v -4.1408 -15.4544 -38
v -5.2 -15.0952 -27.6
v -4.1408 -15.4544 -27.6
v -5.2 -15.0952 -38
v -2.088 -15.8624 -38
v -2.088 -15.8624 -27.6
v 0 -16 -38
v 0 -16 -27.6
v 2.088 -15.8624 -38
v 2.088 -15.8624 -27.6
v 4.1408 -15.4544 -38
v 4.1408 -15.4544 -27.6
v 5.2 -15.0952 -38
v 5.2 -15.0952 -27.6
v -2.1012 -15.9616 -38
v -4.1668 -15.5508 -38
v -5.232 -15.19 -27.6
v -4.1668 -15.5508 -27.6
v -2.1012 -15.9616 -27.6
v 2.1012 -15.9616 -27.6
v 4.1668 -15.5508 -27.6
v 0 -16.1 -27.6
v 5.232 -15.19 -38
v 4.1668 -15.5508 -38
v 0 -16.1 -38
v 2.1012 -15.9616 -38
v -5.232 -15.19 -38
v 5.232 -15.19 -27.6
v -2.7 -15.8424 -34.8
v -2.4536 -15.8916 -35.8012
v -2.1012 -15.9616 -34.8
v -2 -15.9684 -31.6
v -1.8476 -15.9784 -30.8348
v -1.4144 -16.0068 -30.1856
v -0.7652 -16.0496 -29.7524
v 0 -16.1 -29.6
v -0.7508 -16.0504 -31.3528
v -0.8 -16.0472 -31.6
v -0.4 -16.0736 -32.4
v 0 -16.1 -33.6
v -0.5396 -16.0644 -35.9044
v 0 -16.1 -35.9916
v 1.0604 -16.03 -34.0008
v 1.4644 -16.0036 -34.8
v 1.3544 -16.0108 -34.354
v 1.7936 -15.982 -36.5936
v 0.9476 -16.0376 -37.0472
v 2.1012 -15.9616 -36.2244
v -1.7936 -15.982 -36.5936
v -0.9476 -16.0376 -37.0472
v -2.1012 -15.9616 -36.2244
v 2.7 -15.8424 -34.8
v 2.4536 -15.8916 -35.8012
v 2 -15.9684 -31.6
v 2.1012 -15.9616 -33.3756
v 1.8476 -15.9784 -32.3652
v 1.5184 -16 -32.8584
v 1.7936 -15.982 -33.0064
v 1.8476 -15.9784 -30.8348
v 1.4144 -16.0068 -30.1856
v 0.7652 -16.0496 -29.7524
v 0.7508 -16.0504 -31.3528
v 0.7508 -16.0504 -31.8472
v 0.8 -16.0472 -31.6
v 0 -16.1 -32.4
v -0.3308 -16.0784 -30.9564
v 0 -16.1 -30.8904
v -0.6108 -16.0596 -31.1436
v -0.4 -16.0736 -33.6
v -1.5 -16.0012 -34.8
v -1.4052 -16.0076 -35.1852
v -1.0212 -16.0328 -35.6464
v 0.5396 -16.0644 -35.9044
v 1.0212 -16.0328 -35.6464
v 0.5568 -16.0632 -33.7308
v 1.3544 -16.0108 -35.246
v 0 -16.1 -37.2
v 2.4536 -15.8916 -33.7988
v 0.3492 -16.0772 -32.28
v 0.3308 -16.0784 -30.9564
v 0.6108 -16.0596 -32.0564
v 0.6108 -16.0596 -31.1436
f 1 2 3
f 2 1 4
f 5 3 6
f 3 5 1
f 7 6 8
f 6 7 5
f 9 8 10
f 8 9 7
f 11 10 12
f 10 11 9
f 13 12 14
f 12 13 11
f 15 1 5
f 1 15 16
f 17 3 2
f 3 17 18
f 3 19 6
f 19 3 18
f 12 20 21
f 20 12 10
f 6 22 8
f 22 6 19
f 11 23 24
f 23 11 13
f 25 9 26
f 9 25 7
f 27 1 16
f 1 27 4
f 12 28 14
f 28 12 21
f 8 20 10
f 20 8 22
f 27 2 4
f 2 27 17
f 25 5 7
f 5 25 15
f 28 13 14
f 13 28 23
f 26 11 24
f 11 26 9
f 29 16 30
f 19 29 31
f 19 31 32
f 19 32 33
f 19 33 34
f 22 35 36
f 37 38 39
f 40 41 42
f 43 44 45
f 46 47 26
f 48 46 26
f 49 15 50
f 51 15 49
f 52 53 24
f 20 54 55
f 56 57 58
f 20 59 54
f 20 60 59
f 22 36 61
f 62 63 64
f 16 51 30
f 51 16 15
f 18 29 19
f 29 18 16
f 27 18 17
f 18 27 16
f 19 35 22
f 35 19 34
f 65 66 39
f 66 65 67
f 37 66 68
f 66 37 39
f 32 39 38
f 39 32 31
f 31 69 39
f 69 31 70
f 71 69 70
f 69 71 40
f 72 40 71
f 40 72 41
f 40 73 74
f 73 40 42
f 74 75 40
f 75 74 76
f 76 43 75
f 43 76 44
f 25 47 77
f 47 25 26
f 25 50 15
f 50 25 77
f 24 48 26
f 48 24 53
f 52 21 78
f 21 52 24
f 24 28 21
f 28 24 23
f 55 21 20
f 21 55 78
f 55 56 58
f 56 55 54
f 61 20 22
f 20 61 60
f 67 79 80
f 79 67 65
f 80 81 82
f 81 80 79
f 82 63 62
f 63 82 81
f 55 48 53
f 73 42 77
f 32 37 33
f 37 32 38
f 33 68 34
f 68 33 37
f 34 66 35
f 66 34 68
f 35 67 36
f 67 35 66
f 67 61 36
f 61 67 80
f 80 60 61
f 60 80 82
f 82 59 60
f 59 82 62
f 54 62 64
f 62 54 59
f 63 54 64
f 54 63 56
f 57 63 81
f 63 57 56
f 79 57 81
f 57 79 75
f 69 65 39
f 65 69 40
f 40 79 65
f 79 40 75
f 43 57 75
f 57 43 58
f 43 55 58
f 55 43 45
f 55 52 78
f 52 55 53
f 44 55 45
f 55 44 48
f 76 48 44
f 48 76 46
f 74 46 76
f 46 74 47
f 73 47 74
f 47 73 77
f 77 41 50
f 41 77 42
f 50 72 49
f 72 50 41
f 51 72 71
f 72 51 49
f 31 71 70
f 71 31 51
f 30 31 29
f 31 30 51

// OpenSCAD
// file: s/6259b01.scad
use <../../lib.scad>
function ldraw_lib__s__6259b01() = [
// 0 ~Sticker Back  1.3 x  1.3 (Formed)
// 0 Name: s\6259b01.dat
// 0 Author: Chris Böhnke [KnightOfTarenta]
// 0 !LDRAW_ORG Subpart UPDATE 2026-06
// 0 !LICENSE Licensed under CC BY 4.0 : see CAreadme.txt
// 
// 0 BFC CERTIFY CCW
  [0,"BFC","CERTIFY"],
  [0,"BFC","CCW"],
// 
// 0 !HISTORY 2026-06-28 [OrionP] Official Update 2026-06
// 
// 0 // Sticker Backside
// 4 16 -13 69 -37.738 -10.352 69 -38.636 -10.352 95 -38.636 -13 95 -37.738
  [4,16,-13,69,-37.738,-10.352,69,-38.636,-10.352,95,-38.636,-13,95,-37.738],
// 4 16 -10.352 69 -38.636 -5.22 69 -39.656 -5.22 95 -39.656 -10.352 95 -38.636
  [4,16,-10.352,69,-38.636,-5.22,69,-39.656,-5.22,95,-39.656,-10.352,95,-38.636],
// 4 16 -5.22 95 -39.656 -5.22 69 -39.656 0 69 -40 0 95 -40
  [4,16,-5.22,95,-39.656,-5.22,69,-39.656,0,69,-40,0,95,-40],
// 4 16 0 69 -40 5.22 69 -39.656 5.22 95 -39.656 0 95 -40
  [4,16,0,69,-40,5.22,69,-39.656,5.22,95,-39.656,0,95,-40],
// 4 16 5.22 69 -39.656 10.352 69 -38.636 10.352 95 -38.636 5.22 95 -39.656
  [4,16,5.22,69,-39.656,10.352,69,-38.636,10.352,95,-38.636,5.22,95,-39.656],
// 4 16 10.352 69 -38.636 13 69 -37.738 13 95 -37.738 10.352 95 -38.636
  [4,16,10.352,69,-38.636,13,69,-37.738,13,95,-37.738,10.352,95,-38.636],
// 
// 0 // Conditional Lines Back
// 5 24 -10.352 69 -38.636 -10.352 95 -38.636 -5.22 69 -39.656 -13 95 -37.738
  [5,24,-10.352,69,-38.636,-10.352,95,-38.636,-5.22,69,-39.656,-13,95,-37.738],
// 5 24 -5.22 69 -39.656 -5.22 95 -39.656 0 69 -40 -10.352 95 -38.636
  [5,24,-5.22,69,-39.656,-5.22,95,-39.656,0,69,-40,-10.352,95,-38.636],
// 5 24 10.352 69 -38.636 10.352 95 -38.636 5.22 95 -39.656 13 69 -37.738
  [5,24,10.352,69,-38.636,10.352,95,-38.636,5.22,95,-39.656,13,69,-37.738],
// 5 24 0 69 -40 0 95 -40 5.22 69 -39.656 -5.22 95 -39.656
  [5,24,0,69,-40,0,95,-40,5.22,69,-39.656,-5.22,95,-39.656],
// 5 24 5.22 69 -39.656 5.22 95 -39.656 10.352 69 -38.636 0 95 -40
  [5,24,5.22,69,-39.656,5.22,95,-39.656,10.352,69,-38.636,0,95,-40],
// 
// 0 // Sticker Sides
// 4 16 -10.417 95 -38.877 -10.352 95 -38.636 -5.22 95 -39.656 -5.253 95 -39.904
  [4,16,-10.417,95,-38.877,-10.352,95,-38.636,-5.22,95,-39.656,-5.253,95,-39.904],
// 4 16 -10.417 69 -38.877 -10.352 69 -38.636 -13 69 -37.738 -13.08 69 -37.975
  [4,16,-10.417,69,-38.877,-10.352,69,-38.636,-13,69,-37.738,-13.08,69,-37.975],
// 4 16 -5.253 69 -39.904 -5.22 69 -39.656 -10.352 69 -38.636 -10.417 69 -38.877
  [4,16,-5.253,69,-39.904,-5.22,69,-39.656,-10.352,69,-38.636,-10.417,69,-38.877],
// 4 16 5.22 69 -39.656 5.253 69 -39.904 10.417 69 -38.877 10.352 69 -38.636
  [4,16,5.22,69,-39.656,5.253,69,-39.904,10.417,69,-38.877,10.352,69,-38.636],
// 4 16 0 69 -40.25 0 69 -40 -5.22 69 -39.656 -5.253 69 -39.904
  [4,16,0,69,-40.25,0,69,-40,-5.22,69,-39.656,-5.253,69,-39.904],
// 4 16 13 95 -37.738 13.08 95 -37.975 10.417 95 -38.877 10.352 95 -38.636
  [4,16,13,95,-37.738,13.08,95,-37.975,10.417,95,-38.877,10.352,95,-38.636],
// 4 16 0 95 -40.25 0 95 -40 5.22 95 -39.656 5.253 95 -39.904
  [4,16,0,95,-40.25,0,95,-40,5.22,95,-39.656,5.253,95,-39.904],
// 4 16 -10.352 95 -38.636 -10.417 95 -38.877 -13.08 95 -37.975 -13 95 -37.738
  [4,16,-10.352,95,-38.636,-10.417,95,-38.877,-13.08,95,-37.975,-13,95,-37.738],
// 4 16 13.08 69 -37.975 13 69 -37.738 10.352 69 -38.636 10.417 69 -38.877
  [4,16,13.08,69,-37.975,13,69,-37.738,10.352,69,-38.636,10.417,69,-38.877],
// 4 16 5.253 69 -39.904 5.22 69 -39.656 0 69 -40 0 69 -40.25
  [4,16,5.253,69,-39.904,5.22,69,-39.656,0,69,-40,0,69,-40.25],
// 4 16 -13.08 69 -37.975 -13 69 -37.738 -13 95 -37.738 -13.08 95 -37.975
  [4,16,-13.08,69,-37.975,-13,69,-37.738,-13,95,-37.738,-13.08,95,-37.975],
// 4 16 0 95 -40 0 95 -40.25 -5.253 95 -39.904 -5.22 95 -39.656
  [4,16,0,95,-40,0,95,-40.25,-5.253,95,-39.904,-5.22,95,-39.656],
// 4 16 13.08 95 -37.975 13 95 -37.738 13 69 -37.738 13.08 69 -37.975
  [4,16,13.08,95,-37.975,13,95,-37.738,13,69,-37.738,13.08,69,-37.975],
// 4 16 10.352 95 -38.636 10.417 95 -38.877 5.253 95 -39.904 5.22 95 -39.656
  [4,16,10.352,95,-38.636,10.417,95,-38.877,5.253,95,-39.904,5.22,95,-39.656],
// 
// 0 // Conditional Lines Front
// 5 24 0 95 -40.25 0 69 -40.25 5.253 95 -39.904 -5.253 69 -39.904
  [5,24,0,95,-40.25,0,69,-40.25,5.253,95,-39.904,-5.253,69,-39.904],
// 5 24 -5.253 95 -39.904 -5.253 69 -39.904 -10.417 69 -38.877 0 95 -40.25
  [5,24,-5.253,95,-39.904,-5.253,69,-39.904,-10.417,69,-38.877,0,95,-40.25],
// 5 24 5.253 95 -39.904 5.253 69 -39.904 0 69 -40.25 10.417 95 -38.877
  [5,24,5.253,95,-39.904,5.253,69,-39.904,0,69,-40.25,10.417,95,-38.877],
// 5 24 10.417 95 -38.877 10.417 69 -38.877 5.253 69 -39.904 13.08 95 -37.975
  [5,24,10.417,95,-38.877,10.417,69,-38.877,5.253,69,-39.904,13.08,95,-37.975],
// 5 24 -10.417 95 -38.877 -10.417 69 -38.877 -13.08 69 -37.975 -5.253 95 -39.904
  [5,24,-10.417,95,-38.877,-10.417,69,-38.877,-13.08,69,-37.975,-5.253,95,-39.904],
];
module ldraw_lib__s__6259b01(step=0, col=false, unit=2/5, alt=false, line=0.2, solid=!$preview)
    makepoly(ldraw_lib__s__6259b01(), step=step, col=col, unit=unit, alt=alt, line=line, solid=solid);
ldraw_lib__s__6259b01(line=0.2);
// main file
use <../lib.scad>
use <s/6259b01.scad>
function ldraw_lib__169665gc01() = [
// 0 Sticker  1.3 x  1.3 with Black Number "3" (Formed)
// 0 Name: 169665gc01.dat
// 0 Author: Chris Böhnke [KnightOfTarenta]
// 0 !LDRAW_ORG Part UPDATE 2026-06
// 0 !LICENSE Licensed under CC BY 4.0 : see CAreadme.txt
// 
// 0 BFC CERTIFY CCW
  [0,"BFC","CERTIFY"],
  [0,"BFC","CCW"],
// 
// 0 !KEYWORDS Booster Rocket, Bricklink 6339stk01, Brickowl 588738, Launch Command
// 0 !KEYWORDS Rebrickable 169665, set 6339, Shuttle Launch Pad, space port, town
// 
// 0 !HISTORY 2026-06-28 [OrionP] Official Update 2026-06
// 
// 1 16 0 0 0 1 0 0 0 1 0 0 0 1 s\6259b01.dat
  [1,16,0,0,0,1,0,0,0,1,0,0,0,1, ldraw_lib__s__6259b01()],
// 
// 0 // Colour 16 Main Colour
// 3 16 -6.75 87 -39.606 -10.417 95 -38.877 -6.134 89.503 -39.729
  [3,16,-6.75,87,-39.606,-10.417,95,-38.877,-6.134,89.503,-39.729],
// 3 16 -5.253 69 -39.904 -6.75 87 -39.606 -5.253 87 -39.904
  [3,16,-5.253,69,-39.904,-6.75,87,-39.606,-5.253,87,-39.904],
// 3 16 -5.253 69 -39.904 -5.253 87 -39.904 -5 79 -39.921
  [3,16,-5.253,69,-39.904,-5.253,87,-39.904,-5,79,-39.921],
// 3 16 -5.253 69 -39.904 -5 79 -39.921 -4.619 77.087 -39.946
  [3,16,-5.253,69,-39.904,-5,79,-39.921,-4.619,77.087,-39.946],
// 3 16 -5.253 69 -39.904 -4.619 77.087 -39.946 -3.536 75.464 -40.017
  [3,16,-5.253,69,-39.904,-4.619,77.087,-39.946,-3.536,75.464,-40.017],
// 3 16 0 69 -40.25 -1.913 74.381 -40.124 0 74 -40.25
  [3,16,0,69,-40.25,-1.913,74.381,-40.124,0,74,-40.25],
// 3 16 -1.877 78.382 -40.126 -2 79 -40.118 -1 81 -40.184
  [3,16,-1.877,78.382,-40.126,-2,79,-40.118,-1,81,-40.184],
// 3 16 0 84 -40.25 -1.349 89.761 -40.161 0 89.979 -40.25
  [3,16,0,84,-40.25,-1.349,89.761,-40.161,0,89.979,-40.25],
// 3 16 2.651 85.002 -40.075 3.661 87 -40.009 3.386 85.885 -40.027
  [3,16,2.651,85.002,-40.075,3.661,87,-40.009,3.386,85.885,-40.027],
// 3 16 4.484 91.484 -39.955 2.369 92.618 -40.094 5.253 95 -39.904
  [3,16,4.484,91.484,-39.955,2.369,92.618,-40.094,5.253,95,-39.904],
// 3 16 5.253 90.561 -39.904 4.484 91.484 -39.955 5.253 95 -39.904
  [3,16,5.253,90.561,-39.904,4.484,91.484,-39.955,5.253,95,-39.904],
// 3 16 -4.484 91.484 -39.955 -5.253 95 -39.904 -2.369 92.618 -40.094
  [3,16,-4.484,91.484,-39.955,-5.253,95,-39.904,-2.369,92.618,-40.094],
// 3 16 -5.253 90.561 -39.904 -5.253 95 -39.904 -4.484 91.484 -39.955
  [3,16,-5.253,90.561,-39.904,-5.253,95,-39.904,-4.484,91.484,-39.955],
// 3 16 6.75 87 -39.606 6.134 89.503 -39.729 10.417 95 -38.877
  [3,16,6.75,87,-39.606,6.134,89.503,-39.729,10.417,95,-38.877],
// 3 16 5.253 69 -39.904 5 79 -39.921 5.253 83.439 -39.904
  [3,16,5.253,69,-39.904,5,79,-39.921,5.253,83.439,-39.904],
// 3 16 4.619 80.913 -39.946 3.796 82.146 -40 4.484 82.516 -39.955
  [3,16,4.619,80.913,-39.946,3.796,82.146,-40,4.484,82.516,-39.955],
// 3 16 5.253 69 -39.904 4.619 77.087 -39.946 5 79 -39.921
  [3,16,5.253,69,-39.904,4.619,77.087,-39.946,5,79,-39.921],
// 3 16 5.253 69 -39.904 3.536 75.464 -40.017 4.619 77.087 -39.946
  [3,16,5.253,69,-39.904,3.536,75.464,-40.017,4.619,77.087,-39.946],
// 3 16 0 69 -40.25 0 74 -40.25 1.913 74.381 -40.124
  [3,16,0,69,-40.25,0,74,-40.25,1.913,74.381,-40.124],
// 3 16 1.877 78.382 -40.126 1.877 79.618 -40.126 2 79 -40.118
  [3,16,1.877,78.382,-40.126,1.877,79.618,-40.126,2,79,-40.118],
// 4 16 -5.253 95 -39.904 -5.253 90.561 -39.904 -6.134 89.503 -39.729 -10.417 95 -38.877
  [4,16,-5.253,95,-39.904,-5.253,90.561,-39.904,-6.134,89.503,-39.729,-10.417,95,-38.877],
// 4 16 -10.417 69 -38.877 -10.417 95 -38.877 -6.75 87 -39.606 -5.253 69 -39.904
  [4,16,-10.417,69,-38.877,-10.417,95,-38.877,-6.75,87,-39.606,-5.253,69,-39.904],
// 4 16 -10.417 69 -38.877 -13.08 69 -37.975 -13.08 95 -37.975 -10.417 95 -38.877
  [4,16,-10.417,69,-38.877,-13.08,69,-37.975,-13.08,95,-37.975,-10.417,95,-38.877],
// 4 16 -5.253 69 -39.904 -3.536 75.464 -40.017 -1.913 74.381 -40.124 0 69 -40.25
  [4,16,-5.253,69,-39.904,-3.536,75.464,-40.017,-1.913,74.381,-40.124,0,69,-40.25],
// 4 16 0 81 -40.25 0 77.226 -40.25 -.827 77.391 -40.196 -1 81 -40.184
  [4,16,0,81,-40.25,0,77.226,-40.25,-.827,77.391,-40.196,-1,81,-40.184],
// 4 16 -1 81 -40.184 -.827 77.391 -40.196 -1.527 77.859 -40.149 -1.877 78.382 -40.126
  [4,16,-1,81,-40.184,-.827,77.391,-40.196,-1.527,77.859,-40.149,-1.877,78.382,-40.126],
// 4 16 -5.253 87 -39.904 -1 81 -40.184 -2 79 -40.118 -5 79 -39.921
  [4,16,-5.253,87,-39.904,-1,81,-40.184,-2,79,-40.118,-5,79,-39.921],
// 4 16 -1 84 -40.184 -1 81 -40.184 -5.253 87 -39.904 -3.75 87 -40.003
  [4,16,-1,84,-40.184,-1,81,-40.184,-5.253,87,-39.904,-3.75,87,-40.003],
// 4 16 0 84 -40.25 -1 84 -40.184 -3.75 87 -40.003 -3.513 87.963 -40.019
  [4,16,0,84,-40.25,-1,84,-40.184,-3.75,87,-40.003,-3.513,87.963,-40.019],
// 4 16 0 84 -40.25 -3.513 87.963 -40.019 -2.553 89.116 -40.082 -1.349 89.761 -40.161
  [4,16,0,84,-40.25,-3.513,87.963,-40.019,-2.553,89.116,-40.082,-1.349,89.761,-40.161],
// 4 16 0 84 -40.25 0 89.979 -40.25 1.349 89.761 -40.161 2.553 89.116 -40.082
  [4,16,0,84,-40.25,0,89.979,-40.25,1.349,89.761,-40.161,2.553,89.116,-40.082],
// 4 16 0 84 -40.25 2.553 89.116 -40.082 3.386 88.115 -40.027 1.392 84.327 -40.158
  [4,16,0,84,-40.25,2.553,89.116,-40.082,3.386,88.115,-40.027,1.392,84.327,-40.158],
// 4 16 2.651 85.002 -40.075 1.392 84.327 -40.158 3.386 88.115 -40.027 3.661 87 -40.009
  [4,16,2.651,85.002,-40.075,1.392,84.327,-40.158,3.386,88.115,-40.027,3.661,87,-40.009],
// 4 16 2.369 92.618 -40.094 0 93 -40.25 0 95 -40.25 5.253 95 -39.904
  [4,16,2.369,92.618,-40.094,0,93,-40.25,0,95,-40.25,5.253,95,-39.904],
// 4 16 0 95 -40.25 0 93 -40.25 -2.369 92.618 -40.094 -5.253 95 -39.904
  [4,16,0,95,-40.25,0,93,-40.25,-2.369,92.618,-40.094,-5.253,95,-39.904],
// 4 16 10.417 95 -38.877 6.134 89.503 -39.729 5.253 90.561 -39.904 5.253 95 -39.904
  [4,16,10.417,95,-38.877,6.134,89.503,-39.729,5.253,90.561,-39.904,5.253,95,-39.904],
// 4 16 6.75 87 -39.606 10.417 95 -38.877 10.417 69 -38.877 6.134 84.497 -39.729
  [4,16,6.75,87,-39.606,10.417,95,-38.877,10.417,69,-38.877,6.134,84.497,-39.729],
// 4 16 10.417 69 -38.877 10.417 95 -38.877 13.08 95 -37.975 13.08 69 -37.975
  [4,16,10.417,69,-38.877,10.417,95,-38.877,13.08,95,-37.975,13.08,69,-37.975],
// 4 16 5.253 83.439 -39.904 6.134 84.497 -39.729 10.417 69 -38.877 5.253 69 -39.904
  [4,16,5.253,83.439,-39.904,6.134,84.497,-39.729,10.417,69,-38.877,5.253,69,-39.904],
// 4 16 5.253 83.439 -39.904 5 79 -39.921 4.619 80.913 -39.946 4.484 82.516 -39.955
  [4,16,5.253,83.439,-39.904,5,79,-39.921,4.619,80.913,-39.946,4.484,82.516,-39.955],
// 4 16 1.913 74.381 -40.124 3.536 75.464 -40.017 5.253 69 -39.904 0 69 -40.25
  [4,16,1.913,74.381,-40.124,3.536,75.464,-40.017,5.253,69,-39.904,0,69,-40.25],
// 4 16 0 77.226 -40.25 0 81 -40.25 .873 80.7 -40.193 .827 77.391 -40.196
  [4,16,0,77.226,-40.25,0,81,-40.25,.873,80.7,-40.193,.827,77.391,-40.196],
// 4 16 .827 77.391 -40.196 .873 80.7 -40.193 1.527 80.141 -40.149 1.527 77.859 -40.149
  [4,16,.827,77.391,-40.196,.873,80.7,-40.193,1.527,80.141,-40.149,1.527,77.859,-40.149],
// 4 16 1.527 77.859 -40.149 1.527 80.141 -40.149 1.877 79.618 -40.126 1.877 78.382 -40.126
  [4,16,1.527,77.859,-40.149,1.527,80.141,-40.149,1.877,79.618,-40.126,1.877,78.382,-40.126],
// 
// 0 BFC NOCLIP
  [0,"BFC","NOCLIP"],
// 0 // Colour 0 Black
// 3 0 5.253 83.439 -39.904 5.253 90.561 -39.904 6.134 89.503 -39.729
  [3,0,5.253,83.439,-39.904,5.253,90.561,-39.904,6.134,89.503,-39.729],
// 3 0 1.349 89.761 -40.161 0 89.979 -40.25 0 93 -40.25
  [3,0,1.349,89.761,-40.161,0,89.979,-40.25,0,93,-40.25],
// 4 0 -5 79 -39.921 -2 79 -40.118 -1.877 78.382 -40.126 -4.619 77.087 -39.946
  [4,0,-5,79,-39.921,-2,79,-40.118,-1.877,78.382,-40.126,-4.619,77.087,-39.946],
// 4 0 -4.619 77.087 -39.946 -1.877 78.382 -40.126 -1.527 77.859 -40.149 -3.536 75.464 -40.017
  [4,0,-4.619,77.087,-39.946,-1.877,78.382,-40.126,-1.527,77.859,-40.149,-3.536,75.464,-40.017],
// 4 0 -3.536 75.464 -40.017 -1.527 77.859 -40.149 -.827 77.391 -40.196 -1.913 74.381 -40.124
  [4,0,-3.536,75.464,-40.017,-1.527,77.859,-40.149,-.827,77.391,-40.196,-1.913,74.381,-40.124],
// 4 0 -1.913 74.381 -40.124 -.827 77.391 -40.196 0 77.226 -40.25 0 74 -40.25
  [4,0,-1.913,74.381,-40.124,-.827,77.391,-40.196,0,77.226,-40.25,0,74,-40.25],
// 4 0 0 74 -40.25 0 77.226 -40.25 .827 77.391 -40.196 1.913 74.381 -40.124
  [4,0,0,74,-40.25,0,77.226,-40.25,.827,77.391,-40.196,1.913,74.381,-40.124],
// 4 0 3.536 75.464 -40.017 1.913 74.381 -40.124 .827 77.391 -40.196 1.527 77.859 -40.149
  [4,0,3.536,75.464,-40.017,1.913,74.381,-40.124,.827,77.391,-40.196,1.527,77.859,-40.149],
// 4 0 4.619 77.087 -39.946 3.536 75.464 -40.017 1.527 77.859 -40.149 1.877 78.382 -40.126
  [4,0,4.619,77.087,-39.946,3.536,75.464,-40.017,1.527,77.859,-40.149,1.877,78.382,-40.126],
// 4 0 5 79 -39.921 4.619 77.087 -39.946 1.877 78.382 -40.126 2 79 -40.118
  [4,0,5,79,-39.921,4.619,77.087,-39.946,1.877,78.382,-40.126,2,79,-40.118],
// 4 0 4.619 80.913 -39.946 5 79 -39.921 2 79 -40.118 1.877 79.618 -40.126
  [4,0,4.619,80.913,-39.946,5,79,-39.921,2,79,-40.118,1.877,79.618,-40.126],
// 4 0 3.796 82.146 -40 4.619 80.913 -39.946 1.877 79.618 -40.126 1.527 80.141 -40.149
  [4,0,3.796,82.146,-40,4.619,80.913,-39.946,1.877,79.618,-40.126,1.527,80.141,-40.149],
// 4 0 3.796 82.146 -40 1.527 80.141 -40.149 .873 80.7 -40.193 1.392 84.327 -40.158
  [4,0,3.796,82.146,-40,1.527,80.141,-40.149,.873,80.7,-40.193,1.392,84.327,-40.158],
// 4 0 0 81 -40.25 -1 81 -40.184 -1 84 -40.184 0 84 -40.25
  [4,0,0,81,-40.25,-1,81,-40.184,-1,84,-40.184,0,84,-40.25],
// 4 0 .873 80.7 -40.193 0 81 -40.25 0 84 -40.25 1.392 84.327 -40.158
  [4,0,.873,80.7,-40.193,0,81,-40.25,0,84,-40.25,1.392,84.327,-40.158],
// 4 0 3.796 82.146 -40 1.392 84.327 -40.158 2.651 85.002 -40.075 4.484 82.516 -39.955
  [4,0,3.796,82.146,-40,1.392,84.327,-40.158,2.651,85.002,-40.075,4.484,82.516,-39.955],
// 4 0 5.253 83.439 -39.904 4.484 82.516 -39.955 2.651 85.002 -40.075 3.386 85.885 -40.027
  [4,0,5.253,83.439,-39.904,4.484,82.516,-39.955,2.651,85.002,-40.075,3.386,85.885,-40.027],
// 4 0 6.75 87 -39.606 6.134 84.497 -39.729 5.253 83.439 -39.904 6.134 89.503 -39.729
  [4,0,6.75,87,-39.606,6.134,84.497,-39.729,5.253,83.439,-39.904,6.134,89.503,-39.729],
// 4 0 3.661 87 -40.009 5.253 90.561 -39.904 5.253 83.439 -39.904 3.386 85.885 -40.027
  [4,0,3.661,87,-40.009,5.253,90.561,-39.904,5.253,83.439,-39.904,3.386,85.885,-40.027],
// 4 0 5.253 90.561 -39.904 3.661 87 -40.009 3.386 88.115 -40.027 4.484 91.484 -39.955
  [4,0,5.253,90.561,-39.904,3.661,87,-40.009,3.386,88.115,-40.027,4.484,91.484,-39.955],
// 4 0 4.484 91.484 -39.955 3.386 88.115 -40.027 2.553 89.116 -40.082 2.369 92.618 -40.094
  [4,0,4.484,91.484,-39.955,3.386,88.115,-40.027,2.553,89.116,-40.082,2.369,92.618,-40.094],
// 4 0 2.369 92.618 -40.094 2.553 89.116 -40.082 1.349 89.761 -40.161 0 93 -40.25
  [4,0,2.369,92.618,-40.094,2.553,89.116,-40.082,1.349,89.761,-40.161,0,93,-40.25],
// 4 0 -2.369 92.618 -40.094 0 93 -40.25 0 89.979 -40.25 -1.349 89.761 -40.161
  [4,0,-2.369,92.618,-40.094,0,93,-40.25,0,89.979,-40.25,-1.349,89.761,-40.161],
// 4 0 -4.484 91.484 -39.955 -2.369 92.618 -40.094 -1.349 89.761 -40.161 -2.553 89.116 -40.082
  [4,0,-4.484,91.484,-39.955,-2.369,92.618,-40.094,-1.349,89.761,-40.161,-2.553,89.116,-40.082],
// 4 0 -5.253 90.561 -39.904 -4.484 91.484 -39.955 -2.553 89.116 -40.082 -3.513 87.963 -40.019
  [4,0,-5.253,90.561,-39.904,-4.484,91.484,-39.955,-2.553,89.116,-40.082,-3.513,87.963,-40.019],
// 4 0 -5.253 87 -39.904 -5.253 90.561 -39.904 -3.513 87.963 -40.019 -3.75 87 -40.003
  [4,0,-5.253,87,-39.904,-5.253,90.561,-39.904,-3.513,87.963,-40.019,-3.75,87,-40.003],
// 4 0 -6.134 89.503 -39.729 -5.253 90.561 -39.904 -5.253 87 -39.904 -6.75 87 -39.606
  [4,0,-6.134,89.503,-39.729,-5.253,90.561,-39.904,-5.253,87,-39.904,-6.75,87,-39.606],
];
module ldraw_lib__169665gc01(step=0, col=false, unit=2/5, alt=false, line=0.2, solid=!$preview)
    makepoly(ldraw_lib__169665gc01(), step=step, col=col, unit=unit, alt=alt, line=line, solid=solid);
ldraw_lib__169665gc01(line=0.2);
